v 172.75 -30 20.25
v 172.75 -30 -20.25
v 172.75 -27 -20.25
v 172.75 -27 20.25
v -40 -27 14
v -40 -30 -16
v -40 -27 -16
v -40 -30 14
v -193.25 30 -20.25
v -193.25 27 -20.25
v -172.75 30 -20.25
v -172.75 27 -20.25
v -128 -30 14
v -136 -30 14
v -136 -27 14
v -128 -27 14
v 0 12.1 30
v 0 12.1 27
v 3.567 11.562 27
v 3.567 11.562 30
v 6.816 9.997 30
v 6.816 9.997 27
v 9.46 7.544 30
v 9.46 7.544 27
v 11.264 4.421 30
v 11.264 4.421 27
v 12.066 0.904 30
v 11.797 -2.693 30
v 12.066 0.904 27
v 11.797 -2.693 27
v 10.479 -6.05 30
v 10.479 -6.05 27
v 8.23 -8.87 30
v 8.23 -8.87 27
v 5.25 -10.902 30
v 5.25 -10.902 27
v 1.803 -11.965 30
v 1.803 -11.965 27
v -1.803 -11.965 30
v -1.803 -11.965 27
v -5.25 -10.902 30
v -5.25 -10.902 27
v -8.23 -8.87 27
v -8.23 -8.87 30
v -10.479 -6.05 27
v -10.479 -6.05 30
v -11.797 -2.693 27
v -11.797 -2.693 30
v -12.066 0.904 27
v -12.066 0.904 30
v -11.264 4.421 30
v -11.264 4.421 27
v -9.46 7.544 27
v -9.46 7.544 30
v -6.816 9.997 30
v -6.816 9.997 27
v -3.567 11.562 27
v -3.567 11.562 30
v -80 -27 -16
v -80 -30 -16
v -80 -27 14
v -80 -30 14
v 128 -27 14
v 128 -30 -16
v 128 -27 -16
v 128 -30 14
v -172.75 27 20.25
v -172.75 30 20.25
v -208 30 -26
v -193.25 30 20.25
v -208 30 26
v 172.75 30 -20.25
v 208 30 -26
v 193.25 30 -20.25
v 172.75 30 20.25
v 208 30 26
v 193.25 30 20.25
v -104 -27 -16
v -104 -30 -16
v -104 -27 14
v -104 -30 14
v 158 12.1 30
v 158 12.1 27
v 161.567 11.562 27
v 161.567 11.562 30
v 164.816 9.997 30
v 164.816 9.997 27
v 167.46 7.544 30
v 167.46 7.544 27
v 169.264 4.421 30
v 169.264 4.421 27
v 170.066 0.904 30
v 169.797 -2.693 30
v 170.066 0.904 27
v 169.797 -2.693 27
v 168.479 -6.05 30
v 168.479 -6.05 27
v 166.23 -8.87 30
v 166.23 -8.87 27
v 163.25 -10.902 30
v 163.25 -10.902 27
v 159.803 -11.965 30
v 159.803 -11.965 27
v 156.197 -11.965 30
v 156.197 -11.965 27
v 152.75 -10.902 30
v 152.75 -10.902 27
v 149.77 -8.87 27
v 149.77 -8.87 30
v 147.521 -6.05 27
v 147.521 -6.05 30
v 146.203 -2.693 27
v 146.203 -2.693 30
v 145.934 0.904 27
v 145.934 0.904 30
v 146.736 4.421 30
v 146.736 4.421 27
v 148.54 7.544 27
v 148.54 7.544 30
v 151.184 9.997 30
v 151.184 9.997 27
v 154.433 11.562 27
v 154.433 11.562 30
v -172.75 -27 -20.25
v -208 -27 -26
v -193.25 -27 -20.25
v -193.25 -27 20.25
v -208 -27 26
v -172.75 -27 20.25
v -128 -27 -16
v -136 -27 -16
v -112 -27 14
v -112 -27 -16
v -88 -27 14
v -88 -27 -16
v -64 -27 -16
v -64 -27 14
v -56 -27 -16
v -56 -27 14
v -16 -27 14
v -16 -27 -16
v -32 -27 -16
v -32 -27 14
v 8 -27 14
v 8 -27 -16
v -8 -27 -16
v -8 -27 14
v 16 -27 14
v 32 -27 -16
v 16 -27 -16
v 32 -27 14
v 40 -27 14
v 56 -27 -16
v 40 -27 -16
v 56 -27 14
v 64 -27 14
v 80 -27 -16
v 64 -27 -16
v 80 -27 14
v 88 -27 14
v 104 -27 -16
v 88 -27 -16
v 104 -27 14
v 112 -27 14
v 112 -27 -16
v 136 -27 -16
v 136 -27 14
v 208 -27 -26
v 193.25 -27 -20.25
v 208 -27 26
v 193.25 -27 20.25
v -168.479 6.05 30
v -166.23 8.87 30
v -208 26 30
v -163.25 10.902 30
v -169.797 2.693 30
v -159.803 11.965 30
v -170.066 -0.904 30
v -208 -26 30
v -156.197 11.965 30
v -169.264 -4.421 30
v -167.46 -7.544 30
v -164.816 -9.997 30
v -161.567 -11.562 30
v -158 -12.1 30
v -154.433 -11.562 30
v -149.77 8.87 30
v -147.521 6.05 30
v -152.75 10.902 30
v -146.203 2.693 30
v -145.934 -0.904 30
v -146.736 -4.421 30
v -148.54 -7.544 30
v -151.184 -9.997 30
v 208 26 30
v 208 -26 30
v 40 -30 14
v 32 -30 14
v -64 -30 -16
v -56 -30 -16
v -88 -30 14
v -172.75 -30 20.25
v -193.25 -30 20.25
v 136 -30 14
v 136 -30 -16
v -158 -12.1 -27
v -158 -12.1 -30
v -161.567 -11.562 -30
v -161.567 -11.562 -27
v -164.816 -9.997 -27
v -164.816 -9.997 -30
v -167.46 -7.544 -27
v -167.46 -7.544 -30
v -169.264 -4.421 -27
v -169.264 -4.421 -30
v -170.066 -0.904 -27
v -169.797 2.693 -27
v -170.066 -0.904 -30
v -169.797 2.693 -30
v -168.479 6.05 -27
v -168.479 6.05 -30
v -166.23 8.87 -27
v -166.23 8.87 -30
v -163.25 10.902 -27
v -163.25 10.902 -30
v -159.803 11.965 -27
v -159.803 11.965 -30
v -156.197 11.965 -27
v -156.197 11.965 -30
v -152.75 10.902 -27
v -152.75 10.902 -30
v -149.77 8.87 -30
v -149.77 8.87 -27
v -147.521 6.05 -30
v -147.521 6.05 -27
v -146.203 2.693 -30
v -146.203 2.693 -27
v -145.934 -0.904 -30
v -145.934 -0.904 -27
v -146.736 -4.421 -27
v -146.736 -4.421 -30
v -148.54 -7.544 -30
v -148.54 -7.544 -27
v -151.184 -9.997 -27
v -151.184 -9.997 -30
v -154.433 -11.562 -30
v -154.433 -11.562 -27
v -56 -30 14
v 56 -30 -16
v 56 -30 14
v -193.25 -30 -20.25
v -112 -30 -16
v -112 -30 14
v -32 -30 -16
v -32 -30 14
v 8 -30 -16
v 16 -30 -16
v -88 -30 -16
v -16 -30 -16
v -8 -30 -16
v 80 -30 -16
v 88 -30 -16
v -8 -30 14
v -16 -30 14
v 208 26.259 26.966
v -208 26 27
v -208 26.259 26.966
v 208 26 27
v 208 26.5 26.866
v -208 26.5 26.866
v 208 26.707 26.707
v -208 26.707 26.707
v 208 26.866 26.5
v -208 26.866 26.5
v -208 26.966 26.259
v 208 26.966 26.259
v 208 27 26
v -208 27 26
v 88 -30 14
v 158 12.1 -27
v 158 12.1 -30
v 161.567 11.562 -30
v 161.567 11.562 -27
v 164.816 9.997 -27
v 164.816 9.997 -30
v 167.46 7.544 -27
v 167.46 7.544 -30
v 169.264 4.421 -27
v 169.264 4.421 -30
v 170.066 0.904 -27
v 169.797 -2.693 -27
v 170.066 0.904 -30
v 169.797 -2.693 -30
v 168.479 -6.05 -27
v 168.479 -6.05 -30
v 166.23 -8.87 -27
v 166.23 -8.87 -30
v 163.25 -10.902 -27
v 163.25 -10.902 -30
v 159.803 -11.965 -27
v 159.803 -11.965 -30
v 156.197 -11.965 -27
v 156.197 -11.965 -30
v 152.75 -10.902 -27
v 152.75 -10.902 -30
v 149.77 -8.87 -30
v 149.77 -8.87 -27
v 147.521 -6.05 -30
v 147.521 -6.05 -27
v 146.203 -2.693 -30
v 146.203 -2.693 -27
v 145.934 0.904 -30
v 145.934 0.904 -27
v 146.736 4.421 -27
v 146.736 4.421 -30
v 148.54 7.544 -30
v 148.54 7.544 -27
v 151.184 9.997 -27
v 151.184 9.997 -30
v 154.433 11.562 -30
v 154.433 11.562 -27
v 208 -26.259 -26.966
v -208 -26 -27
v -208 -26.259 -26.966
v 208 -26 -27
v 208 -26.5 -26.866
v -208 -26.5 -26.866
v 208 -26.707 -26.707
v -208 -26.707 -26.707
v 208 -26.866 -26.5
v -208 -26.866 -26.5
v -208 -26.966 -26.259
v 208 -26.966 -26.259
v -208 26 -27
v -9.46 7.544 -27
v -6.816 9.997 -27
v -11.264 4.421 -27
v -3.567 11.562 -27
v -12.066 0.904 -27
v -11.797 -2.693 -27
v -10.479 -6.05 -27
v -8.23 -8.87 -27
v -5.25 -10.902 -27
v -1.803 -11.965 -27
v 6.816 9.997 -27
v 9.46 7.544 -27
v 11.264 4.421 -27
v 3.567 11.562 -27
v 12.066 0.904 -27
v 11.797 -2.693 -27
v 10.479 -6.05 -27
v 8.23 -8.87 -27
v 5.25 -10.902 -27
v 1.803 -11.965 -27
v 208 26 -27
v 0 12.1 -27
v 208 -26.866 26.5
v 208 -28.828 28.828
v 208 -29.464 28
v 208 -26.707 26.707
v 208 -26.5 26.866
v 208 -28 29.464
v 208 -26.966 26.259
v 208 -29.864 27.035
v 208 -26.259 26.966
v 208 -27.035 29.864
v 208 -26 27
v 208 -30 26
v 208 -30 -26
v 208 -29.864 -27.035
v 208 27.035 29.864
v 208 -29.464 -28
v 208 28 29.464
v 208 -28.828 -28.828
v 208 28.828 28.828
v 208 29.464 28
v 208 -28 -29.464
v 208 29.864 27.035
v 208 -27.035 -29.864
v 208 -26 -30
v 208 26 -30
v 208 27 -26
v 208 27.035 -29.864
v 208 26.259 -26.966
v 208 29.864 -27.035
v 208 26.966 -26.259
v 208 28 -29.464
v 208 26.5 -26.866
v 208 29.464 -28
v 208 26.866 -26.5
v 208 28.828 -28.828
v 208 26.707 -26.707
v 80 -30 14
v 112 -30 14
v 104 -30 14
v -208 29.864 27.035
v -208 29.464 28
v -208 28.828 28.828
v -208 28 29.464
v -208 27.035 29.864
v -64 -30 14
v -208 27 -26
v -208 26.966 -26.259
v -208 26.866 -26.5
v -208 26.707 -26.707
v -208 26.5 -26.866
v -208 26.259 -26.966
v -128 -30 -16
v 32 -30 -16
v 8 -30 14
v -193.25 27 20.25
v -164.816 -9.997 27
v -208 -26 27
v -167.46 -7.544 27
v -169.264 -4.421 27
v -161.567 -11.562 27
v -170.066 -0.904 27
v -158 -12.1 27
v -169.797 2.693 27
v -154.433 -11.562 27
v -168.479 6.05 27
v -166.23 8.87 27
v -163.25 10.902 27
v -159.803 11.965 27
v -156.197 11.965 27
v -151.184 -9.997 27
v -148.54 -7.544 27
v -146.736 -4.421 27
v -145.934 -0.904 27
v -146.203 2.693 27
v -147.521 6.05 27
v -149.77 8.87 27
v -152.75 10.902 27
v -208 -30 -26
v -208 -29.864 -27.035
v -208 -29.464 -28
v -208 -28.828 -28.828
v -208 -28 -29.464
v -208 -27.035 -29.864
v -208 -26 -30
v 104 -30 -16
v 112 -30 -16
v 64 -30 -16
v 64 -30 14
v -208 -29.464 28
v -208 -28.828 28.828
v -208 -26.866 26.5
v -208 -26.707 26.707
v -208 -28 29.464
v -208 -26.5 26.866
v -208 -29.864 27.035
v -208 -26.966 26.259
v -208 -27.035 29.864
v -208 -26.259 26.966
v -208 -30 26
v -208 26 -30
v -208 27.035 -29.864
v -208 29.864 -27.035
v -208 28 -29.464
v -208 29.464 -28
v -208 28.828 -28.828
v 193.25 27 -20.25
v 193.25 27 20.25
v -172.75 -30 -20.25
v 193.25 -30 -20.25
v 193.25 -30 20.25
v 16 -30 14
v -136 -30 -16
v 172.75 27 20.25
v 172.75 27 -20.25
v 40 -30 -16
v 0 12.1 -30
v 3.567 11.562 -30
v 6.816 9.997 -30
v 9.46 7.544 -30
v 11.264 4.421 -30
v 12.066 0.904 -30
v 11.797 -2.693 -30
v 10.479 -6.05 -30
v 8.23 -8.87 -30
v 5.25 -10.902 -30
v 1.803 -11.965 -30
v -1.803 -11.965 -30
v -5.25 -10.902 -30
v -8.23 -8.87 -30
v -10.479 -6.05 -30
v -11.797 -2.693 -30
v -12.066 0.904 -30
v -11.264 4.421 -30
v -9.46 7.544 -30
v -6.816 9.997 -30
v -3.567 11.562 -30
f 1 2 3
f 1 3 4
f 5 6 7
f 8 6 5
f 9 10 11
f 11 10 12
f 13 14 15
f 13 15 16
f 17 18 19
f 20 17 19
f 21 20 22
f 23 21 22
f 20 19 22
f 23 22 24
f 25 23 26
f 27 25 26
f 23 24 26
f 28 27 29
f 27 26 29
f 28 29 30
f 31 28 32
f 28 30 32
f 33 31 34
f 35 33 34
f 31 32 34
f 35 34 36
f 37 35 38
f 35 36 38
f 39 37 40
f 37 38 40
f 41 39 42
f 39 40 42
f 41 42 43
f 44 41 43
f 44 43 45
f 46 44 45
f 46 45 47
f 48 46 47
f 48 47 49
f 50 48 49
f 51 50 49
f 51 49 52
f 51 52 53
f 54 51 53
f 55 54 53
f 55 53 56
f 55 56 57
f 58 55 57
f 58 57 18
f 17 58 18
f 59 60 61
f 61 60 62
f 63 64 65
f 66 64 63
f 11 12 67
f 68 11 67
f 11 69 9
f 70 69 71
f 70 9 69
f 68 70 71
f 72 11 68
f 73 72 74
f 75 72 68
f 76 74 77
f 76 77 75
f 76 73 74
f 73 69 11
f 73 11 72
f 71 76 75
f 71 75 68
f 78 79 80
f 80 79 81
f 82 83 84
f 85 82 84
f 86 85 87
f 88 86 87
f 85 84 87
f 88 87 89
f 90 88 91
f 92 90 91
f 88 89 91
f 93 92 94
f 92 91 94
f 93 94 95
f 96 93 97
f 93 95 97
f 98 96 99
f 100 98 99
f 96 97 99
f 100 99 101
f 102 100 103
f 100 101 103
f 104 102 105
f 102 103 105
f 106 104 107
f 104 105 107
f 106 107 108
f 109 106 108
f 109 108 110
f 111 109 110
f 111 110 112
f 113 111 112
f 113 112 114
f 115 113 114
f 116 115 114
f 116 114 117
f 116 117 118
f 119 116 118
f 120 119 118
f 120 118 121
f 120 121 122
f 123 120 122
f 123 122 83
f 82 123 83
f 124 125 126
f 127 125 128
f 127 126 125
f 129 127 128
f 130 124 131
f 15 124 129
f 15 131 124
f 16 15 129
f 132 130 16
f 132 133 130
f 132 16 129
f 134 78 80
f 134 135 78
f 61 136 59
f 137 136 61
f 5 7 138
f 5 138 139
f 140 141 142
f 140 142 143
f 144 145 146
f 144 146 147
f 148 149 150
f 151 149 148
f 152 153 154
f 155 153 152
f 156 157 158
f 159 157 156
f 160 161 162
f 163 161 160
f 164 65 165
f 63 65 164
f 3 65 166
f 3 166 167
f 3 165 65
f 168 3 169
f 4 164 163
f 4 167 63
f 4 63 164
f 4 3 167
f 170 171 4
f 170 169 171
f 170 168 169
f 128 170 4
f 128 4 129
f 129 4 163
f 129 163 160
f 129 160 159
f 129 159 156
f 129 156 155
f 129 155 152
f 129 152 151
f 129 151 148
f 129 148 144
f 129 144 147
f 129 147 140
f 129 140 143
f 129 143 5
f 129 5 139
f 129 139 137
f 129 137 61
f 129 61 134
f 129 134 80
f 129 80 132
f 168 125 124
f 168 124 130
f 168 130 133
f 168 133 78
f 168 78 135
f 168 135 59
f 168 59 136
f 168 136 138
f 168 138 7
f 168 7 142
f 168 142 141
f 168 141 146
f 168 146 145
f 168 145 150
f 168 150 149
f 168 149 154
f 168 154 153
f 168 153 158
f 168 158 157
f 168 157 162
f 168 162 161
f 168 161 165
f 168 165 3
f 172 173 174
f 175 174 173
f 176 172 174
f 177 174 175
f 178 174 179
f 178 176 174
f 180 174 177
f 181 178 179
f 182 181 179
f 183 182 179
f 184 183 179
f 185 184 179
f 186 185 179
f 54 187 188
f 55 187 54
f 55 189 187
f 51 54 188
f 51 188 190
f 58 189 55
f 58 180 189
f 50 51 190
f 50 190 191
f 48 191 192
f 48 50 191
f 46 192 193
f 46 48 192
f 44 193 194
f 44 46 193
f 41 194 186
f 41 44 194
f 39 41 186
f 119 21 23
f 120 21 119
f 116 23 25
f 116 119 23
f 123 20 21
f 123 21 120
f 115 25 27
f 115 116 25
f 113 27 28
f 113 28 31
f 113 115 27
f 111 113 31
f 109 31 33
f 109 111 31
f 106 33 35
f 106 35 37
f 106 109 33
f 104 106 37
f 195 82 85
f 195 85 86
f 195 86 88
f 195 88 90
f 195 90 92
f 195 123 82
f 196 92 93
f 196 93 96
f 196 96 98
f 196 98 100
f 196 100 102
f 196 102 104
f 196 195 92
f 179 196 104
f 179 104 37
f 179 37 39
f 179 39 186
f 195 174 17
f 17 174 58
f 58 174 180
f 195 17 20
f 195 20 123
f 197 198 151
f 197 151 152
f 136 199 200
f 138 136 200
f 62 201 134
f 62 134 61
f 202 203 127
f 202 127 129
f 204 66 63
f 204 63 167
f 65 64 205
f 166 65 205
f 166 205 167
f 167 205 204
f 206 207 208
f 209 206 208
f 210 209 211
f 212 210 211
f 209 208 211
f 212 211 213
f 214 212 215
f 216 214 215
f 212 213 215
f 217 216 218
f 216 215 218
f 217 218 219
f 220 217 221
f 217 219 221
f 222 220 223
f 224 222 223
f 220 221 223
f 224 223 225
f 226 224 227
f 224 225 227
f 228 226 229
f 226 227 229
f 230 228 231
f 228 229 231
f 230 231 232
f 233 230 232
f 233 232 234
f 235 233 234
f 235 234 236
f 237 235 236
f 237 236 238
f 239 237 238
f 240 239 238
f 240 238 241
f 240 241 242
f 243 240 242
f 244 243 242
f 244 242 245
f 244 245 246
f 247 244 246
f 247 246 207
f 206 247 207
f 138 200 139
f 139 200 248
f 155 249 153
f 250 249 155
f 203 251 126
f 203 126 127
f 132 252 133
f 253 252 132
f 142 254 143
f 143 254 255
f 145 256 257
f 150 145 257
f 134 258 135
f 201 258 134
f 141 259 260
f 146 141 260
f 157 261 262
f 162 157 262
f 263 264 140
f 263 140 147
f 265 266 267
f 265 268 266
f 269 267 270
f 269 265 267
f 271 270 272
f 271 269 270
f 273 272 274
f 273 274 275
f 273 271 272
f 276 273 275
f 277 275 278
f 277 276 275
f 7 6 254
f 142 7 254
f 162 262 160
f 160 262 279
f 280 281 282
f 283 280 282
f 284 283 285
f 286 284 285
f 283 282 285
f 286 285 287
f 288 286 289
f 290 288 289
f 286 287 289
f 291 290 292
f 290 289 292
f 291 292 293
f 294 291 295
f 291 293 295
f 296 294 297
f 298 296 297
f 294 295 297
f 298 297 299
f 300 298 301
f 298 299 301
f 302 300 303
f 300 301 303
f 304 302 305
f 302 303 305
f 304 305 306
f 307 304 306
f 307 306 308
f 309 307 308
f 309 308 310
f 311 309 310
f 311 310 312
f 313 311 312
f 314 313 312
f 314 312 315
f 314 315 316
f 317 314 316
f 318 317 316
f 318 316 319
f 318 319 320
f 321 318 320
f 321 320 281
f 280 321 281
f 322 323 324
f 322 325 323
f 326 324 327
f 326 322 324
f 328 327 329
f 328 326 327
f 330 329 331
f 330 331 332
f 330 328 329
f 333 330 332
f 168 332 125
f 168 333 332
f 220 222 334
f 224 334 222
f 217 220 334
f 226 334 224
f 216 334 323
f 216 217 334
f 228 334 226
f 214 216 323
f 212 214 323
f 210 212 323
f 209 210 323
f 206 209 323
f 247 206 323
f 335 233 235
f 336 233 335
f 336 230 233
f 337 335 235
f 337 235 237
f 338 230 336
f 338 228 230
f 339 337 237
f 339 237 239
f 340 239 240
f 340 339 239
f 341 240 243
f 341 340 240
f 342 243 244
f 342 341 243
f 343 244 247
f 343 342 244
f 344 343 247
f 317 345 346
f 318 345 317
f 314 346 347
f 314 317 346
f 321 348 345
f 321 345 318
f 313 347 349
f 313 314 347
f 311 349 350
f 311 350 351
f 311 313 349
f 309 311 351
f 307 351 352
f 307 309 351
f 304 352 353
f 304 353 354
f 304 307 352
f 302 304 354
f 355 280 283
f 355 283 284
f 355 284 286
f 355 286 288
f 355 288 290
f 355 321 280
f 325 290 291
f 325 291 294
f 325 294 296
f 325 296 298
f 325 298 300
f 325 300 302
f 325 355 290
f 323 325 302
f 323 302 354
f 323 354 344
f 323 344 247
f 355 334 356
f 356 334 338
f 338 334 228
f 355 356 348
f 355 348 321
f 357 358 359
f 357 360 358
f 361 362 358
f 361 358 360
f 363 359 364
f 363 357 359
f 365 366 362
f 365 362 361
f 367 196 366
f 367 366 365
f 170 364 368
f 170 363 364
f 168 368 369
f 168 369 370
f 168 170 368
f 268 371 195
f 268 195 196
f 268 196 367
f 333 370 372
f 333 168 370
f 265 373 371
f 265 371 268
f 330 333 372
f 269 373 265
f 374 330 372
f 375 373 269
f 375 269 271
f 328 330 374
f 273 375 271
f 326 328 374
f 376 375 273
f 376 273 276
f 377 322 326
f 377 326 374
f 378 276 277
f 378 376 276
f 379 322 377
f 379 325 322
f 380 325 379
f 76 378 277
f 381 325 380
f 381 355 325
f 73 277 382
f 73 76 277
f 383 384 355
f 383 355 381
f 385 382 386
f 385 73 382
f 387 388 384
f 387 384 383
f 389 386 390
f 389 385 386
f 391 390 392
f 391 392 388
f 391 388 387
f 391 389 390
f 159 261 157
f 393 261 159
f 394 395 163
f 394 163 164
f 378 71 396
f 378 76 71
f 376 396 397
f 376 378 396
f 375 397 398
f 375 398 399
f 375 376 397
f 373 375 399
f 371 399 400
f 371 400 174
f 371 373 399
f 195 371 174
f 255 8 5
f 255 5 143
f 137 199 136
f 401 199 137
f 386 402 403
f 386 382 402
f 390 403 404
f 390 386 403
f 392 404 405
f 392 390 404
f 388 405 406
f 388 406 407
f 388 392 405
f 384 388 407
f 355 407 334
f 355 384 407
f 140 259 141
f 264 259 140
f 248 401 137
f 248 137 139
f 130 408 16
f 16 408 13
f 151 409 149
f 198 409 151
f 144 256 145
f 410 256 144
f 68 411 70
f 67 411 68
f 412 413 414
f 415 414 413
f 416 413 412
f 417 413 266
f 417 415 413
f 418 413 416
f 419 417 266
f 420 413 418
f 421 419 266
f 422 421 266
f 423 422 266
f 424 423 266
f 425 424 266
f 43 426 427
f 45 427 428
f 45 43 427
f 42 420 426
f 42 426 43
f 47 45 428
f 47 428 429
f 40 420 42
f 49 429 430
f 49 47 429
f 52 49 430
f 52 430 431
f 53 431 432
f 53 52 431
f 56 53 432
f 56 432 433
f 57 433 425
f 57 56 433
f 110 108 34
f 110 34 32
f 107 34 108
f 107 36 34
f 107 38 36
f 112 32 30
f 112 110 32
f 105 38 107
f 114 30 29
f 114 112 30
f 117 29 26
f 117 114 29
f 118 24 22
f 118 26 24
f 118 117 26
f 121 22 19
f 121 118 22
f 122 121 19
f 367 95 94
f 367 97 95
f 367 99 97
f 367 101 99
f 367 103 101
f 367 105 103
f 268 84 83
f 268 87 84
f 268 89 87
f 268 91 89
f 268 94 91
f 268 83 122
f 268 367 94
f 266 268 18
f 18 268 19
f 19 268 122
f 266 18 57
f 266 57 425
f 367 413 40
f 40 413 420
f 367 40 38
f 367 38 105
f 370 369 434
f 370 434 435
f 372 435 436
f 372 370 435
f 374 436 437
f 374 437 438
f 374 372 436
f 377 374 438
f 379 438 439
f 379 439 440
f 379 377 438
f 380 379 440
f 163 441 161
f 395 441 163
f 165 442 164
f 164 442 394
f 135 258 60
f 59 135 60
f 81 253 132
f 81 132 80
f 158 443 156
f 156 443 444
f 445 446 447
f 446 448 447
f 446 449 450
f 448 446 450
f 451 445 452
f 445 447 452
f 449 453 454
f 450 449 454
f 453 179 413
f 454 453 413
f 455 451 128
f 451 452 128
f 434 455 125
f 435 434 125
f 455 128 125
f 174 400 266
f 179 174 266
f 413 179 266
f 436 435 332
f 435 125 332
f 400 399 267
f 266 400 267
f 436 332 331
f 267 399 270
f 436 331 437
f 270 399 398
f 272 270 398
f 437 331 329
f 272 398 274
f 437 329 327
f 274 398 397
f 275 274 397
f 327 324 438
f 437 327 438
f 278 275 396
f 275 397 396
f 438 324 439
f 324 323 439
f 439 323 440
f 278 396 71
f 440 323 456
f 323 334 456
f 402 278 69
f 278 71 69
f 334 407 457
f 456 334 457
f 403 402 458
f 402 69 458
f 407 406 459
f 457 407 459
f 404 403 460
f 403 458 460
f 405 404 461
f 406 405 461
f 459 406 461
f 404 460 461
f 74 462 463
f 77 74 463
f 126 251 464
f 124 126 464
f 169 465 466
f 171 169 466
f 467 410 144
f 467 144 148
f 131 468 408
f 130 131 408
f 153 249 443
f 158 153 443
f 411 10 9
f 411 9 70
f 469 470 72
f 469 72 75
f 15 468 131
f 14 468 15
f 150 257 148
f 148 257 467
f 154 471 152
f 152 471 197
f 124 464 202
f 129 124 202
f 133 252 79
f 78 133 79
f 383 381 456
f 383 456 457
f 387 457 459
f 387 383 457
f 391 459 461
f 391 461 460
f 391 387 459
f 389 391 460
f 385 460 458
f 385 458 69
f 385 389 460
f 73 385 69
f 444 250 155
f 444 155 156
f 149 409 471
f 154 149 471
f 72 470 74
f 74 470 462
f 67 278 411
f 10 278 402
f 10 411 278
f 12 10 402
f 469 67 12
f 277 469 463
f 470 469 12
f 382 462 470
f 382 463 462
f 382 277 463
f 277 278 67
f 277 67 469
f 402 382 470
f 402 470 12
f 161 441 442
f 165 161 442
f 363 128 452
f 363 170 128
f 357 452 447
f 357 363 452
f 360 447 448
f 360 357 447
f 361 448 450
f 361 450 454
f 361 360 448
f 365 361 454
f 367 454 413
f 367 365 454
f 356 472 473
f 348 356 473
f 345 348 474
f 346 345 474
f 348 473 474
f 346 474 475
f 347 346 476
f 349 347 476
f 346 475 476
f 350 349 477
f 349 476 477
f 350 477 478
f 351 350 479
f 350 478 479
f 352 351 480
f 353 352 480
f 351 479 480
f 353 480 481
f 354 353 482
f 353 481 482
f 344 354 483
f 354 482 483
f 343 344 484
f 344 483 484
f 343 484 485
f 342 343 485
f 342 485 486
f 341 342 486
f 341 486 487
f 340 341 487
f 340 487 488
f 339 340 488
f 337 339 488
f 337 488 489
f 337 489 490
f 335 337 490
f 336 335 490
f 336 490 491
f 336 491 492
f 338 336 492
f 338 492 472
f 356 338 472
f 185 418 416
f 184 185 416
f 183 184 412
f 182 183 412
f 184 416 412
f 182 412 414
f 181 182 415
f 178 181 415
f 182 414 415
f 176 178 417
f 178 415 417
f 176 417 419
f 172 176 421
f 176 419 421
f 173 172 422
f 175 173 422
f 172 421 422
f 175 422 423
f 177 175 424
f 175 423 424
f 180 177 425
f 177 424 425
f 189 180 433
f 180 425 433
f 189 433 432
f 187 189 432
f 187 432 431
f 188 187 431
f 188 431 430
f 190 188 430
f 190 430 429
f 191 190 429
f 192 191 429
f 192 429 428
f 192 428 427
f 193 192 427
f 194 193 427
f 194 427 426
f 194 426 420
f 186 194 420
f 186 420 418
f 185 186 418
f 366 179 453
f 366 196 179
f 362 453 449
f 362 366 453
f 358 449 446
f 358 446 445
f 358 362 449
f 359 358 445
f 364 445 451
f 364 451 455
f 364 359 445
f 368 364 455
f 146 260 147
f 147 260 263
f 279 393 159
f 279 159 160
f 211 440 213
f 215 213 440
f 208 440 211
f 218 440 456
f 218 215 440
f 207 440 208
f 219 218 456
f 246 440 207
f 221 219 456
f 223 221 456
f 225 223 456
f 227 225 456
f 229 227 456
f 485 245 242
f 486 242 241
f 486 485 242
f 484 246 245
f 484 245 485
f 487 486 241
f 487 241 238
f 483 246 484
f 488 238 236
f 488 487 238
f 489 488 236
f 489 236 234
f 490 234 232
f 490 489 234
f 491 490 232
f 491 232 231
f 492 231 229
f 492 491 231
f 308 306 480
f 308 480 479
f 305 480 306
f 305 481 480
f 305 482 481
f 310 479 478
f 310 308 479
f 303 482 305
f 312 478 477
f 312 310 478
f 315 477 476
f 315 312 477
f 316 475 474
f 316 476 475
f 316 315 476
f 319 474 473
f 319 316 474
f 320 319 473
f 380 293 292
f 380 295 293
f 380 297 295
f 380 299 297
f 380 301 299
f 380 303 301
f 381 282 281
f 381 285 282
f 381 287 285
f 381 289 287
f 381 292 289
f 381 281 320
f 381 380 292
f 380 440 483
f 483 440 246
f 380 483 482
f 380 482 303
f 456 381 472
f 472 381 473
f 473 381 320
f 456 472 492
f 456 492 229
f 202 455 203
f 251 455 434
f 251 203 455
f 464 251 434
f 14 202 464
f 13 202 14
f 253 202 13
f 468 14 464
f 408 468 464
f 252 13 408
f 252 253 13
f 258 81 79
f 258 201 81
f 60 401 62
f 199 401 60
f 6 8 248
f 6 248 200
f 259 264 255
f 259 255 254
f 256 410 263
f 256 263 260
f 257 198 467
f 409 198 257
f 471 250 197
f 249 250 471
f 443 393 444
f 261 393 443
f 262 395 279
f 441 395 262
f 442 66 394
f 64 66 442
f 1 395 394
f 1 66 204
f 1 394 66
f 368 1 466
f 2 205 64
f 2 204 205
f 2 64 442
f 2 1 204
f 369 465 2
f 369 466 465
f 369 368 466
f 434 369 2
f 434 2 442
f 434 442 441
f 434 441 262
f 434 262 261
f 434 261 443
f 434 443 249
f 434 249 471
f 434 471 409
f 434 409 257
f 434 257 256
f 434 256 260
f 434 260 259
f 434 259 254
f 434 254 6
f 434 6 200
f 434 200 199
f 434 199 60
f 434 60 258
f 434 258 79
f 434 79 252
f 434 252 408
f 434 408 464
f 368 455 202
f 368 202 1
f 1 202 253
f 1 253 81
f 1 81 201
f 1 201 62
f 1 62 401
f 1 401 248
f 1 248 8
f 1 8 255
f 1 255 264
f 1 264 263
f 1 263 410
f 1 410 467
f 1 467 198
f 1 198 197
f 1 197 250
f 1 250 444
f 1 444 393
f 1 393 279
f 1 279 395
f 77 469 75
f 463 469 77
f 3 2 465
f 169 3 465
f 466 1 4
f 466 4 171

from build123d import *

# Parameters (mm, degrees)
EXTRUDE_1_DEPTH            = 208
SKETCH_3_W                 = 8
SKETCH_3_H                 = 30
CUT_EXTRUDE_1_DEPTH        = 3
PATTERN_LINEAR_1_COUNT     = 6
PATTERN_LINEAR_1_PITCH     = 24
PATTERN_LINEAR_1_COL_COUNT = 7
PATTERN_LINEAR_1_COL_PITCH = 24
CUT_EXTRUDE_2_REACH        = 220.55
SKETCH_5_W                 = 20.5
SKETCH_5_H                 = 40.5
CUT_EXTRUDE_5_REACH        = 220.55
SKETCH_10_R                = 12.1


with BuildPart() as part:
    # Эскиз1 → Бобышка-Вытянуть1 (new, symmetric)
    with BuildSketch(Plane(origin=(0, 0, 0), x_dir=(0, 0, -1), z_dir=(1, 0, 0))):
        with BuildLine():
            Line((-26, -30), (26, -30))
            ThreePointArc((26, -30), (28.828427125, -28.828427125), (30, -26))
            Line((30, -26), (30, 26))
            ThreePointArc((30, 26), (28.828427125, 28.828427125), (26, 30))
            Line((26, 30), (-26, 30))
            ThreePointArc((-26, 30), (-28.828427125, 28.828427125), (-30, 26))
            Line((-30, 26), (-30, -26))
            ThreePointArc((-30, -26), (-28.828427125, -28.828427125), (-26, -30))
        make_face()
        with BuildLine():
            Line((-26, 27), (26, 27))
            ThreePointArc((26, 27), (26.707106781, 26.707106781), (27, 26))
            Line((27, 26), (27, -26))
            ThreePointArc((27, -26), (26.707106781, -26.707106781), (26, -27))
            Line((26, -27), (-26, -27))
            ThreePointArc((-26, -27), (-26.707106781, -26.707106781), (-27, -26))
            Line((-27, -26), (-27, 26))
            ThreePointArc((-27, 26), (-26.707106781, 26.707106781), (-26, 27))
        make_face(mode=Mode.SUBTRACT)
    extrude(amount=EXTRUDE_1_DEPTH, both=True)

    # Эскиз3 → Вырез-Вытянуть1 (cut)
    with BuildSketch(Plane.XZ.offset(30)):
        with Locations((-12, -1)):
            Rectangle(SKETCH_3_W, SKETCH_3_H)
    cut_extrude_1 = extrude(amount=-CUT_EXTRUDE_1_DEPTH, mode=Mode.SUBTRACT)

    # Линейный массив1: Вырез-Вытянуть1 ×6
    with Locations(*[(-i * PATTERN_LINEAR_1_PITCH, 0, 0) for i in range(1, PATTERN_LINEAR_1_COUNT)]):
        add(cut_extrude_1, mode=Mode.SUBTRACT)

    # Линейный массив1 col: Вырез-Вытянуть1 ×7
    with Locations(*[(i * PATTERN_LINEAR_1_COL_PITCH, 0, 0) for i in range(1, PATTERN_LINEAR_1_COL_COUNT)]):
        add(cut_extrude_1, mode=Mode.SUBTRACT)

    # Вырез-Вытянуть2: up to this face of the body (flat: up to its plane)
    cut_extrude_2_end = Plane(part.part.faces().sort_by_distance((0, 30, 0))[0])
    # Эскиз5 → Вырез-Вытянуть2 (cut, up to the picked face)
    with BuildSketch(Plane.XZ.offset(30), mode=Mode.PRIVATE) as cut_extrude_2_sk1:
        with Locations((-183, 0)):
            Rectangle(SKETCH_5_W, SKETCH_5_H)
    cut_extrude_2_tool1 = split(extrude(cut_extrude_2_sk1.sketch, amount=-CUT_EXTRUDE_2_REACH, mode=Mode.PRIVATE), bisect_by=cut_extrude_2_end, keep=Keep.BOTH, mode=Mode.PRIVATE)
    # Эскиз5 → Вырез-Вытянуть2 (cut, up to the picked face)
    with BuildSketch(Plane.XZ.offset(30), mode=Mode.PRIVATE) as cut_extrude_2_sk2:
        with Locations((183, 0)):
            Rectangle(SKETCH_5_W, SKETCH_5_H)
    cut_extrude_2_tool2 = split(extrude(cut_extrude_2_sk2.sketch, amount=-CUT_EXTRUDE_2_REACH, mode=Mode.PRIVATE), bisect_by=cut_extrude_2_end, keep=Keep.BOTH, mode=Mode.PRIVATE)
    add(cut_extrude_2_tool1.solids().sort_by(Axis((-183, -30, 0), (0, 1, 0)))[0], mode=Mode.SUBTRACT)
    add(cut_extrude_2_tool2.solids().sort_by(Axis((183, -30, 0), (0, 1, 0)))[0], mode=Mode.SUBTRACT)

    # Вырез-Вытянуть5: up to this face of the body (flat: up to its plane)
    cut_extrude_5_end = Plane(part.part.faces().sort_by_distance((0, 0, 30))[0])
    # Эскиз10 → Вырез-Вытянуть5 (cut, up to the picked face)
    with BuildSketch(Plane(origin=(0, 0, -30), x_dir=(-1, 0, 0), z_dir=(0, 0, -1)), mode=Mode.PRIVATE) as cut_extrude_5_sk1:
        with Locations(Location((-158, 0, 0), (0, 0, 90))):
            Circle(SKETCH_10_R)
    cut_extrude_5_tool1 = split(extrude(cut_extrude_5_sk1.sketch, amount=-CUT_EXTRUDE_5_REACH, mode=Mode.PRIVATE), bisect_by=cut_extrude_5_end, keep=Keep.BOTH, mode=Mode.PRIVATE)
    # Эскиз10 → Вырез-Вытянуть5 (cut, up to the picked face)
    with BuildSketch(Plane(origin=(0, 0, -30), x_dir=(-1, 0, 0), z_dir=(0, 0, -1)), mode=Mode.PRIVATE) as cut_extrude_5_sk2:
        with Locations(Location((158, 0, 0), (0, 0, 270))):
            Circle(SKETCH_10_R)
    cut_extrude_5_tool2 = split(extrude(cut_extrude_5_sk2.sketch, amount=-CUT_EXTRUDE_5_REACH, mode=Mode.PRIVATE), bisect_by=cut_extrude_5_end, keep=Keep.BOTH, mode=Mode.PRIVATE)
    # Эскиз10 → Вырез-Вытянуть5 (cut, up to the picked face)
    with BuildSketch(Plane(origin=(0, 0, -30), x_dir=(-1, 0, 0), z_dir=(0, 0, -1)), mode=Mode.PRIVATE) as cut_extrude_5_sk3:
        with Locations(Location((0, 0, 0), (0, 0, 90))):
            Circle(SKETCH_10_R)
    cut_extrude_5_tool3 = split(extrude(cut_extrude_5_sk3.sketch, amount=-CUT_EXTRUDE_5_REACH, mode=Mode.PRIVATE), bisect_by=cut_extrude_5_end, keep=Keep.BOTH, mode=Mode.PRIVATE)
    add(cut_extrude_5_tool1.solids().sort_by(Axis((158, 0, -30), (0, 0, 1)))[0], mode=Mode.SUBTRACT)
    add(cut_extrude_5_tool2.solids().sort_by(Axis((-158, 0, -30), (0, 0, 1)))[0], mode=Mode.SUBTRACT)
    add(cut_extrude_5_tool3.solids().sort_by(Axis((0, 0, -30), (0, 0, 1)))[0], mode=Mode.SUBTRACT)


solid = part.part
